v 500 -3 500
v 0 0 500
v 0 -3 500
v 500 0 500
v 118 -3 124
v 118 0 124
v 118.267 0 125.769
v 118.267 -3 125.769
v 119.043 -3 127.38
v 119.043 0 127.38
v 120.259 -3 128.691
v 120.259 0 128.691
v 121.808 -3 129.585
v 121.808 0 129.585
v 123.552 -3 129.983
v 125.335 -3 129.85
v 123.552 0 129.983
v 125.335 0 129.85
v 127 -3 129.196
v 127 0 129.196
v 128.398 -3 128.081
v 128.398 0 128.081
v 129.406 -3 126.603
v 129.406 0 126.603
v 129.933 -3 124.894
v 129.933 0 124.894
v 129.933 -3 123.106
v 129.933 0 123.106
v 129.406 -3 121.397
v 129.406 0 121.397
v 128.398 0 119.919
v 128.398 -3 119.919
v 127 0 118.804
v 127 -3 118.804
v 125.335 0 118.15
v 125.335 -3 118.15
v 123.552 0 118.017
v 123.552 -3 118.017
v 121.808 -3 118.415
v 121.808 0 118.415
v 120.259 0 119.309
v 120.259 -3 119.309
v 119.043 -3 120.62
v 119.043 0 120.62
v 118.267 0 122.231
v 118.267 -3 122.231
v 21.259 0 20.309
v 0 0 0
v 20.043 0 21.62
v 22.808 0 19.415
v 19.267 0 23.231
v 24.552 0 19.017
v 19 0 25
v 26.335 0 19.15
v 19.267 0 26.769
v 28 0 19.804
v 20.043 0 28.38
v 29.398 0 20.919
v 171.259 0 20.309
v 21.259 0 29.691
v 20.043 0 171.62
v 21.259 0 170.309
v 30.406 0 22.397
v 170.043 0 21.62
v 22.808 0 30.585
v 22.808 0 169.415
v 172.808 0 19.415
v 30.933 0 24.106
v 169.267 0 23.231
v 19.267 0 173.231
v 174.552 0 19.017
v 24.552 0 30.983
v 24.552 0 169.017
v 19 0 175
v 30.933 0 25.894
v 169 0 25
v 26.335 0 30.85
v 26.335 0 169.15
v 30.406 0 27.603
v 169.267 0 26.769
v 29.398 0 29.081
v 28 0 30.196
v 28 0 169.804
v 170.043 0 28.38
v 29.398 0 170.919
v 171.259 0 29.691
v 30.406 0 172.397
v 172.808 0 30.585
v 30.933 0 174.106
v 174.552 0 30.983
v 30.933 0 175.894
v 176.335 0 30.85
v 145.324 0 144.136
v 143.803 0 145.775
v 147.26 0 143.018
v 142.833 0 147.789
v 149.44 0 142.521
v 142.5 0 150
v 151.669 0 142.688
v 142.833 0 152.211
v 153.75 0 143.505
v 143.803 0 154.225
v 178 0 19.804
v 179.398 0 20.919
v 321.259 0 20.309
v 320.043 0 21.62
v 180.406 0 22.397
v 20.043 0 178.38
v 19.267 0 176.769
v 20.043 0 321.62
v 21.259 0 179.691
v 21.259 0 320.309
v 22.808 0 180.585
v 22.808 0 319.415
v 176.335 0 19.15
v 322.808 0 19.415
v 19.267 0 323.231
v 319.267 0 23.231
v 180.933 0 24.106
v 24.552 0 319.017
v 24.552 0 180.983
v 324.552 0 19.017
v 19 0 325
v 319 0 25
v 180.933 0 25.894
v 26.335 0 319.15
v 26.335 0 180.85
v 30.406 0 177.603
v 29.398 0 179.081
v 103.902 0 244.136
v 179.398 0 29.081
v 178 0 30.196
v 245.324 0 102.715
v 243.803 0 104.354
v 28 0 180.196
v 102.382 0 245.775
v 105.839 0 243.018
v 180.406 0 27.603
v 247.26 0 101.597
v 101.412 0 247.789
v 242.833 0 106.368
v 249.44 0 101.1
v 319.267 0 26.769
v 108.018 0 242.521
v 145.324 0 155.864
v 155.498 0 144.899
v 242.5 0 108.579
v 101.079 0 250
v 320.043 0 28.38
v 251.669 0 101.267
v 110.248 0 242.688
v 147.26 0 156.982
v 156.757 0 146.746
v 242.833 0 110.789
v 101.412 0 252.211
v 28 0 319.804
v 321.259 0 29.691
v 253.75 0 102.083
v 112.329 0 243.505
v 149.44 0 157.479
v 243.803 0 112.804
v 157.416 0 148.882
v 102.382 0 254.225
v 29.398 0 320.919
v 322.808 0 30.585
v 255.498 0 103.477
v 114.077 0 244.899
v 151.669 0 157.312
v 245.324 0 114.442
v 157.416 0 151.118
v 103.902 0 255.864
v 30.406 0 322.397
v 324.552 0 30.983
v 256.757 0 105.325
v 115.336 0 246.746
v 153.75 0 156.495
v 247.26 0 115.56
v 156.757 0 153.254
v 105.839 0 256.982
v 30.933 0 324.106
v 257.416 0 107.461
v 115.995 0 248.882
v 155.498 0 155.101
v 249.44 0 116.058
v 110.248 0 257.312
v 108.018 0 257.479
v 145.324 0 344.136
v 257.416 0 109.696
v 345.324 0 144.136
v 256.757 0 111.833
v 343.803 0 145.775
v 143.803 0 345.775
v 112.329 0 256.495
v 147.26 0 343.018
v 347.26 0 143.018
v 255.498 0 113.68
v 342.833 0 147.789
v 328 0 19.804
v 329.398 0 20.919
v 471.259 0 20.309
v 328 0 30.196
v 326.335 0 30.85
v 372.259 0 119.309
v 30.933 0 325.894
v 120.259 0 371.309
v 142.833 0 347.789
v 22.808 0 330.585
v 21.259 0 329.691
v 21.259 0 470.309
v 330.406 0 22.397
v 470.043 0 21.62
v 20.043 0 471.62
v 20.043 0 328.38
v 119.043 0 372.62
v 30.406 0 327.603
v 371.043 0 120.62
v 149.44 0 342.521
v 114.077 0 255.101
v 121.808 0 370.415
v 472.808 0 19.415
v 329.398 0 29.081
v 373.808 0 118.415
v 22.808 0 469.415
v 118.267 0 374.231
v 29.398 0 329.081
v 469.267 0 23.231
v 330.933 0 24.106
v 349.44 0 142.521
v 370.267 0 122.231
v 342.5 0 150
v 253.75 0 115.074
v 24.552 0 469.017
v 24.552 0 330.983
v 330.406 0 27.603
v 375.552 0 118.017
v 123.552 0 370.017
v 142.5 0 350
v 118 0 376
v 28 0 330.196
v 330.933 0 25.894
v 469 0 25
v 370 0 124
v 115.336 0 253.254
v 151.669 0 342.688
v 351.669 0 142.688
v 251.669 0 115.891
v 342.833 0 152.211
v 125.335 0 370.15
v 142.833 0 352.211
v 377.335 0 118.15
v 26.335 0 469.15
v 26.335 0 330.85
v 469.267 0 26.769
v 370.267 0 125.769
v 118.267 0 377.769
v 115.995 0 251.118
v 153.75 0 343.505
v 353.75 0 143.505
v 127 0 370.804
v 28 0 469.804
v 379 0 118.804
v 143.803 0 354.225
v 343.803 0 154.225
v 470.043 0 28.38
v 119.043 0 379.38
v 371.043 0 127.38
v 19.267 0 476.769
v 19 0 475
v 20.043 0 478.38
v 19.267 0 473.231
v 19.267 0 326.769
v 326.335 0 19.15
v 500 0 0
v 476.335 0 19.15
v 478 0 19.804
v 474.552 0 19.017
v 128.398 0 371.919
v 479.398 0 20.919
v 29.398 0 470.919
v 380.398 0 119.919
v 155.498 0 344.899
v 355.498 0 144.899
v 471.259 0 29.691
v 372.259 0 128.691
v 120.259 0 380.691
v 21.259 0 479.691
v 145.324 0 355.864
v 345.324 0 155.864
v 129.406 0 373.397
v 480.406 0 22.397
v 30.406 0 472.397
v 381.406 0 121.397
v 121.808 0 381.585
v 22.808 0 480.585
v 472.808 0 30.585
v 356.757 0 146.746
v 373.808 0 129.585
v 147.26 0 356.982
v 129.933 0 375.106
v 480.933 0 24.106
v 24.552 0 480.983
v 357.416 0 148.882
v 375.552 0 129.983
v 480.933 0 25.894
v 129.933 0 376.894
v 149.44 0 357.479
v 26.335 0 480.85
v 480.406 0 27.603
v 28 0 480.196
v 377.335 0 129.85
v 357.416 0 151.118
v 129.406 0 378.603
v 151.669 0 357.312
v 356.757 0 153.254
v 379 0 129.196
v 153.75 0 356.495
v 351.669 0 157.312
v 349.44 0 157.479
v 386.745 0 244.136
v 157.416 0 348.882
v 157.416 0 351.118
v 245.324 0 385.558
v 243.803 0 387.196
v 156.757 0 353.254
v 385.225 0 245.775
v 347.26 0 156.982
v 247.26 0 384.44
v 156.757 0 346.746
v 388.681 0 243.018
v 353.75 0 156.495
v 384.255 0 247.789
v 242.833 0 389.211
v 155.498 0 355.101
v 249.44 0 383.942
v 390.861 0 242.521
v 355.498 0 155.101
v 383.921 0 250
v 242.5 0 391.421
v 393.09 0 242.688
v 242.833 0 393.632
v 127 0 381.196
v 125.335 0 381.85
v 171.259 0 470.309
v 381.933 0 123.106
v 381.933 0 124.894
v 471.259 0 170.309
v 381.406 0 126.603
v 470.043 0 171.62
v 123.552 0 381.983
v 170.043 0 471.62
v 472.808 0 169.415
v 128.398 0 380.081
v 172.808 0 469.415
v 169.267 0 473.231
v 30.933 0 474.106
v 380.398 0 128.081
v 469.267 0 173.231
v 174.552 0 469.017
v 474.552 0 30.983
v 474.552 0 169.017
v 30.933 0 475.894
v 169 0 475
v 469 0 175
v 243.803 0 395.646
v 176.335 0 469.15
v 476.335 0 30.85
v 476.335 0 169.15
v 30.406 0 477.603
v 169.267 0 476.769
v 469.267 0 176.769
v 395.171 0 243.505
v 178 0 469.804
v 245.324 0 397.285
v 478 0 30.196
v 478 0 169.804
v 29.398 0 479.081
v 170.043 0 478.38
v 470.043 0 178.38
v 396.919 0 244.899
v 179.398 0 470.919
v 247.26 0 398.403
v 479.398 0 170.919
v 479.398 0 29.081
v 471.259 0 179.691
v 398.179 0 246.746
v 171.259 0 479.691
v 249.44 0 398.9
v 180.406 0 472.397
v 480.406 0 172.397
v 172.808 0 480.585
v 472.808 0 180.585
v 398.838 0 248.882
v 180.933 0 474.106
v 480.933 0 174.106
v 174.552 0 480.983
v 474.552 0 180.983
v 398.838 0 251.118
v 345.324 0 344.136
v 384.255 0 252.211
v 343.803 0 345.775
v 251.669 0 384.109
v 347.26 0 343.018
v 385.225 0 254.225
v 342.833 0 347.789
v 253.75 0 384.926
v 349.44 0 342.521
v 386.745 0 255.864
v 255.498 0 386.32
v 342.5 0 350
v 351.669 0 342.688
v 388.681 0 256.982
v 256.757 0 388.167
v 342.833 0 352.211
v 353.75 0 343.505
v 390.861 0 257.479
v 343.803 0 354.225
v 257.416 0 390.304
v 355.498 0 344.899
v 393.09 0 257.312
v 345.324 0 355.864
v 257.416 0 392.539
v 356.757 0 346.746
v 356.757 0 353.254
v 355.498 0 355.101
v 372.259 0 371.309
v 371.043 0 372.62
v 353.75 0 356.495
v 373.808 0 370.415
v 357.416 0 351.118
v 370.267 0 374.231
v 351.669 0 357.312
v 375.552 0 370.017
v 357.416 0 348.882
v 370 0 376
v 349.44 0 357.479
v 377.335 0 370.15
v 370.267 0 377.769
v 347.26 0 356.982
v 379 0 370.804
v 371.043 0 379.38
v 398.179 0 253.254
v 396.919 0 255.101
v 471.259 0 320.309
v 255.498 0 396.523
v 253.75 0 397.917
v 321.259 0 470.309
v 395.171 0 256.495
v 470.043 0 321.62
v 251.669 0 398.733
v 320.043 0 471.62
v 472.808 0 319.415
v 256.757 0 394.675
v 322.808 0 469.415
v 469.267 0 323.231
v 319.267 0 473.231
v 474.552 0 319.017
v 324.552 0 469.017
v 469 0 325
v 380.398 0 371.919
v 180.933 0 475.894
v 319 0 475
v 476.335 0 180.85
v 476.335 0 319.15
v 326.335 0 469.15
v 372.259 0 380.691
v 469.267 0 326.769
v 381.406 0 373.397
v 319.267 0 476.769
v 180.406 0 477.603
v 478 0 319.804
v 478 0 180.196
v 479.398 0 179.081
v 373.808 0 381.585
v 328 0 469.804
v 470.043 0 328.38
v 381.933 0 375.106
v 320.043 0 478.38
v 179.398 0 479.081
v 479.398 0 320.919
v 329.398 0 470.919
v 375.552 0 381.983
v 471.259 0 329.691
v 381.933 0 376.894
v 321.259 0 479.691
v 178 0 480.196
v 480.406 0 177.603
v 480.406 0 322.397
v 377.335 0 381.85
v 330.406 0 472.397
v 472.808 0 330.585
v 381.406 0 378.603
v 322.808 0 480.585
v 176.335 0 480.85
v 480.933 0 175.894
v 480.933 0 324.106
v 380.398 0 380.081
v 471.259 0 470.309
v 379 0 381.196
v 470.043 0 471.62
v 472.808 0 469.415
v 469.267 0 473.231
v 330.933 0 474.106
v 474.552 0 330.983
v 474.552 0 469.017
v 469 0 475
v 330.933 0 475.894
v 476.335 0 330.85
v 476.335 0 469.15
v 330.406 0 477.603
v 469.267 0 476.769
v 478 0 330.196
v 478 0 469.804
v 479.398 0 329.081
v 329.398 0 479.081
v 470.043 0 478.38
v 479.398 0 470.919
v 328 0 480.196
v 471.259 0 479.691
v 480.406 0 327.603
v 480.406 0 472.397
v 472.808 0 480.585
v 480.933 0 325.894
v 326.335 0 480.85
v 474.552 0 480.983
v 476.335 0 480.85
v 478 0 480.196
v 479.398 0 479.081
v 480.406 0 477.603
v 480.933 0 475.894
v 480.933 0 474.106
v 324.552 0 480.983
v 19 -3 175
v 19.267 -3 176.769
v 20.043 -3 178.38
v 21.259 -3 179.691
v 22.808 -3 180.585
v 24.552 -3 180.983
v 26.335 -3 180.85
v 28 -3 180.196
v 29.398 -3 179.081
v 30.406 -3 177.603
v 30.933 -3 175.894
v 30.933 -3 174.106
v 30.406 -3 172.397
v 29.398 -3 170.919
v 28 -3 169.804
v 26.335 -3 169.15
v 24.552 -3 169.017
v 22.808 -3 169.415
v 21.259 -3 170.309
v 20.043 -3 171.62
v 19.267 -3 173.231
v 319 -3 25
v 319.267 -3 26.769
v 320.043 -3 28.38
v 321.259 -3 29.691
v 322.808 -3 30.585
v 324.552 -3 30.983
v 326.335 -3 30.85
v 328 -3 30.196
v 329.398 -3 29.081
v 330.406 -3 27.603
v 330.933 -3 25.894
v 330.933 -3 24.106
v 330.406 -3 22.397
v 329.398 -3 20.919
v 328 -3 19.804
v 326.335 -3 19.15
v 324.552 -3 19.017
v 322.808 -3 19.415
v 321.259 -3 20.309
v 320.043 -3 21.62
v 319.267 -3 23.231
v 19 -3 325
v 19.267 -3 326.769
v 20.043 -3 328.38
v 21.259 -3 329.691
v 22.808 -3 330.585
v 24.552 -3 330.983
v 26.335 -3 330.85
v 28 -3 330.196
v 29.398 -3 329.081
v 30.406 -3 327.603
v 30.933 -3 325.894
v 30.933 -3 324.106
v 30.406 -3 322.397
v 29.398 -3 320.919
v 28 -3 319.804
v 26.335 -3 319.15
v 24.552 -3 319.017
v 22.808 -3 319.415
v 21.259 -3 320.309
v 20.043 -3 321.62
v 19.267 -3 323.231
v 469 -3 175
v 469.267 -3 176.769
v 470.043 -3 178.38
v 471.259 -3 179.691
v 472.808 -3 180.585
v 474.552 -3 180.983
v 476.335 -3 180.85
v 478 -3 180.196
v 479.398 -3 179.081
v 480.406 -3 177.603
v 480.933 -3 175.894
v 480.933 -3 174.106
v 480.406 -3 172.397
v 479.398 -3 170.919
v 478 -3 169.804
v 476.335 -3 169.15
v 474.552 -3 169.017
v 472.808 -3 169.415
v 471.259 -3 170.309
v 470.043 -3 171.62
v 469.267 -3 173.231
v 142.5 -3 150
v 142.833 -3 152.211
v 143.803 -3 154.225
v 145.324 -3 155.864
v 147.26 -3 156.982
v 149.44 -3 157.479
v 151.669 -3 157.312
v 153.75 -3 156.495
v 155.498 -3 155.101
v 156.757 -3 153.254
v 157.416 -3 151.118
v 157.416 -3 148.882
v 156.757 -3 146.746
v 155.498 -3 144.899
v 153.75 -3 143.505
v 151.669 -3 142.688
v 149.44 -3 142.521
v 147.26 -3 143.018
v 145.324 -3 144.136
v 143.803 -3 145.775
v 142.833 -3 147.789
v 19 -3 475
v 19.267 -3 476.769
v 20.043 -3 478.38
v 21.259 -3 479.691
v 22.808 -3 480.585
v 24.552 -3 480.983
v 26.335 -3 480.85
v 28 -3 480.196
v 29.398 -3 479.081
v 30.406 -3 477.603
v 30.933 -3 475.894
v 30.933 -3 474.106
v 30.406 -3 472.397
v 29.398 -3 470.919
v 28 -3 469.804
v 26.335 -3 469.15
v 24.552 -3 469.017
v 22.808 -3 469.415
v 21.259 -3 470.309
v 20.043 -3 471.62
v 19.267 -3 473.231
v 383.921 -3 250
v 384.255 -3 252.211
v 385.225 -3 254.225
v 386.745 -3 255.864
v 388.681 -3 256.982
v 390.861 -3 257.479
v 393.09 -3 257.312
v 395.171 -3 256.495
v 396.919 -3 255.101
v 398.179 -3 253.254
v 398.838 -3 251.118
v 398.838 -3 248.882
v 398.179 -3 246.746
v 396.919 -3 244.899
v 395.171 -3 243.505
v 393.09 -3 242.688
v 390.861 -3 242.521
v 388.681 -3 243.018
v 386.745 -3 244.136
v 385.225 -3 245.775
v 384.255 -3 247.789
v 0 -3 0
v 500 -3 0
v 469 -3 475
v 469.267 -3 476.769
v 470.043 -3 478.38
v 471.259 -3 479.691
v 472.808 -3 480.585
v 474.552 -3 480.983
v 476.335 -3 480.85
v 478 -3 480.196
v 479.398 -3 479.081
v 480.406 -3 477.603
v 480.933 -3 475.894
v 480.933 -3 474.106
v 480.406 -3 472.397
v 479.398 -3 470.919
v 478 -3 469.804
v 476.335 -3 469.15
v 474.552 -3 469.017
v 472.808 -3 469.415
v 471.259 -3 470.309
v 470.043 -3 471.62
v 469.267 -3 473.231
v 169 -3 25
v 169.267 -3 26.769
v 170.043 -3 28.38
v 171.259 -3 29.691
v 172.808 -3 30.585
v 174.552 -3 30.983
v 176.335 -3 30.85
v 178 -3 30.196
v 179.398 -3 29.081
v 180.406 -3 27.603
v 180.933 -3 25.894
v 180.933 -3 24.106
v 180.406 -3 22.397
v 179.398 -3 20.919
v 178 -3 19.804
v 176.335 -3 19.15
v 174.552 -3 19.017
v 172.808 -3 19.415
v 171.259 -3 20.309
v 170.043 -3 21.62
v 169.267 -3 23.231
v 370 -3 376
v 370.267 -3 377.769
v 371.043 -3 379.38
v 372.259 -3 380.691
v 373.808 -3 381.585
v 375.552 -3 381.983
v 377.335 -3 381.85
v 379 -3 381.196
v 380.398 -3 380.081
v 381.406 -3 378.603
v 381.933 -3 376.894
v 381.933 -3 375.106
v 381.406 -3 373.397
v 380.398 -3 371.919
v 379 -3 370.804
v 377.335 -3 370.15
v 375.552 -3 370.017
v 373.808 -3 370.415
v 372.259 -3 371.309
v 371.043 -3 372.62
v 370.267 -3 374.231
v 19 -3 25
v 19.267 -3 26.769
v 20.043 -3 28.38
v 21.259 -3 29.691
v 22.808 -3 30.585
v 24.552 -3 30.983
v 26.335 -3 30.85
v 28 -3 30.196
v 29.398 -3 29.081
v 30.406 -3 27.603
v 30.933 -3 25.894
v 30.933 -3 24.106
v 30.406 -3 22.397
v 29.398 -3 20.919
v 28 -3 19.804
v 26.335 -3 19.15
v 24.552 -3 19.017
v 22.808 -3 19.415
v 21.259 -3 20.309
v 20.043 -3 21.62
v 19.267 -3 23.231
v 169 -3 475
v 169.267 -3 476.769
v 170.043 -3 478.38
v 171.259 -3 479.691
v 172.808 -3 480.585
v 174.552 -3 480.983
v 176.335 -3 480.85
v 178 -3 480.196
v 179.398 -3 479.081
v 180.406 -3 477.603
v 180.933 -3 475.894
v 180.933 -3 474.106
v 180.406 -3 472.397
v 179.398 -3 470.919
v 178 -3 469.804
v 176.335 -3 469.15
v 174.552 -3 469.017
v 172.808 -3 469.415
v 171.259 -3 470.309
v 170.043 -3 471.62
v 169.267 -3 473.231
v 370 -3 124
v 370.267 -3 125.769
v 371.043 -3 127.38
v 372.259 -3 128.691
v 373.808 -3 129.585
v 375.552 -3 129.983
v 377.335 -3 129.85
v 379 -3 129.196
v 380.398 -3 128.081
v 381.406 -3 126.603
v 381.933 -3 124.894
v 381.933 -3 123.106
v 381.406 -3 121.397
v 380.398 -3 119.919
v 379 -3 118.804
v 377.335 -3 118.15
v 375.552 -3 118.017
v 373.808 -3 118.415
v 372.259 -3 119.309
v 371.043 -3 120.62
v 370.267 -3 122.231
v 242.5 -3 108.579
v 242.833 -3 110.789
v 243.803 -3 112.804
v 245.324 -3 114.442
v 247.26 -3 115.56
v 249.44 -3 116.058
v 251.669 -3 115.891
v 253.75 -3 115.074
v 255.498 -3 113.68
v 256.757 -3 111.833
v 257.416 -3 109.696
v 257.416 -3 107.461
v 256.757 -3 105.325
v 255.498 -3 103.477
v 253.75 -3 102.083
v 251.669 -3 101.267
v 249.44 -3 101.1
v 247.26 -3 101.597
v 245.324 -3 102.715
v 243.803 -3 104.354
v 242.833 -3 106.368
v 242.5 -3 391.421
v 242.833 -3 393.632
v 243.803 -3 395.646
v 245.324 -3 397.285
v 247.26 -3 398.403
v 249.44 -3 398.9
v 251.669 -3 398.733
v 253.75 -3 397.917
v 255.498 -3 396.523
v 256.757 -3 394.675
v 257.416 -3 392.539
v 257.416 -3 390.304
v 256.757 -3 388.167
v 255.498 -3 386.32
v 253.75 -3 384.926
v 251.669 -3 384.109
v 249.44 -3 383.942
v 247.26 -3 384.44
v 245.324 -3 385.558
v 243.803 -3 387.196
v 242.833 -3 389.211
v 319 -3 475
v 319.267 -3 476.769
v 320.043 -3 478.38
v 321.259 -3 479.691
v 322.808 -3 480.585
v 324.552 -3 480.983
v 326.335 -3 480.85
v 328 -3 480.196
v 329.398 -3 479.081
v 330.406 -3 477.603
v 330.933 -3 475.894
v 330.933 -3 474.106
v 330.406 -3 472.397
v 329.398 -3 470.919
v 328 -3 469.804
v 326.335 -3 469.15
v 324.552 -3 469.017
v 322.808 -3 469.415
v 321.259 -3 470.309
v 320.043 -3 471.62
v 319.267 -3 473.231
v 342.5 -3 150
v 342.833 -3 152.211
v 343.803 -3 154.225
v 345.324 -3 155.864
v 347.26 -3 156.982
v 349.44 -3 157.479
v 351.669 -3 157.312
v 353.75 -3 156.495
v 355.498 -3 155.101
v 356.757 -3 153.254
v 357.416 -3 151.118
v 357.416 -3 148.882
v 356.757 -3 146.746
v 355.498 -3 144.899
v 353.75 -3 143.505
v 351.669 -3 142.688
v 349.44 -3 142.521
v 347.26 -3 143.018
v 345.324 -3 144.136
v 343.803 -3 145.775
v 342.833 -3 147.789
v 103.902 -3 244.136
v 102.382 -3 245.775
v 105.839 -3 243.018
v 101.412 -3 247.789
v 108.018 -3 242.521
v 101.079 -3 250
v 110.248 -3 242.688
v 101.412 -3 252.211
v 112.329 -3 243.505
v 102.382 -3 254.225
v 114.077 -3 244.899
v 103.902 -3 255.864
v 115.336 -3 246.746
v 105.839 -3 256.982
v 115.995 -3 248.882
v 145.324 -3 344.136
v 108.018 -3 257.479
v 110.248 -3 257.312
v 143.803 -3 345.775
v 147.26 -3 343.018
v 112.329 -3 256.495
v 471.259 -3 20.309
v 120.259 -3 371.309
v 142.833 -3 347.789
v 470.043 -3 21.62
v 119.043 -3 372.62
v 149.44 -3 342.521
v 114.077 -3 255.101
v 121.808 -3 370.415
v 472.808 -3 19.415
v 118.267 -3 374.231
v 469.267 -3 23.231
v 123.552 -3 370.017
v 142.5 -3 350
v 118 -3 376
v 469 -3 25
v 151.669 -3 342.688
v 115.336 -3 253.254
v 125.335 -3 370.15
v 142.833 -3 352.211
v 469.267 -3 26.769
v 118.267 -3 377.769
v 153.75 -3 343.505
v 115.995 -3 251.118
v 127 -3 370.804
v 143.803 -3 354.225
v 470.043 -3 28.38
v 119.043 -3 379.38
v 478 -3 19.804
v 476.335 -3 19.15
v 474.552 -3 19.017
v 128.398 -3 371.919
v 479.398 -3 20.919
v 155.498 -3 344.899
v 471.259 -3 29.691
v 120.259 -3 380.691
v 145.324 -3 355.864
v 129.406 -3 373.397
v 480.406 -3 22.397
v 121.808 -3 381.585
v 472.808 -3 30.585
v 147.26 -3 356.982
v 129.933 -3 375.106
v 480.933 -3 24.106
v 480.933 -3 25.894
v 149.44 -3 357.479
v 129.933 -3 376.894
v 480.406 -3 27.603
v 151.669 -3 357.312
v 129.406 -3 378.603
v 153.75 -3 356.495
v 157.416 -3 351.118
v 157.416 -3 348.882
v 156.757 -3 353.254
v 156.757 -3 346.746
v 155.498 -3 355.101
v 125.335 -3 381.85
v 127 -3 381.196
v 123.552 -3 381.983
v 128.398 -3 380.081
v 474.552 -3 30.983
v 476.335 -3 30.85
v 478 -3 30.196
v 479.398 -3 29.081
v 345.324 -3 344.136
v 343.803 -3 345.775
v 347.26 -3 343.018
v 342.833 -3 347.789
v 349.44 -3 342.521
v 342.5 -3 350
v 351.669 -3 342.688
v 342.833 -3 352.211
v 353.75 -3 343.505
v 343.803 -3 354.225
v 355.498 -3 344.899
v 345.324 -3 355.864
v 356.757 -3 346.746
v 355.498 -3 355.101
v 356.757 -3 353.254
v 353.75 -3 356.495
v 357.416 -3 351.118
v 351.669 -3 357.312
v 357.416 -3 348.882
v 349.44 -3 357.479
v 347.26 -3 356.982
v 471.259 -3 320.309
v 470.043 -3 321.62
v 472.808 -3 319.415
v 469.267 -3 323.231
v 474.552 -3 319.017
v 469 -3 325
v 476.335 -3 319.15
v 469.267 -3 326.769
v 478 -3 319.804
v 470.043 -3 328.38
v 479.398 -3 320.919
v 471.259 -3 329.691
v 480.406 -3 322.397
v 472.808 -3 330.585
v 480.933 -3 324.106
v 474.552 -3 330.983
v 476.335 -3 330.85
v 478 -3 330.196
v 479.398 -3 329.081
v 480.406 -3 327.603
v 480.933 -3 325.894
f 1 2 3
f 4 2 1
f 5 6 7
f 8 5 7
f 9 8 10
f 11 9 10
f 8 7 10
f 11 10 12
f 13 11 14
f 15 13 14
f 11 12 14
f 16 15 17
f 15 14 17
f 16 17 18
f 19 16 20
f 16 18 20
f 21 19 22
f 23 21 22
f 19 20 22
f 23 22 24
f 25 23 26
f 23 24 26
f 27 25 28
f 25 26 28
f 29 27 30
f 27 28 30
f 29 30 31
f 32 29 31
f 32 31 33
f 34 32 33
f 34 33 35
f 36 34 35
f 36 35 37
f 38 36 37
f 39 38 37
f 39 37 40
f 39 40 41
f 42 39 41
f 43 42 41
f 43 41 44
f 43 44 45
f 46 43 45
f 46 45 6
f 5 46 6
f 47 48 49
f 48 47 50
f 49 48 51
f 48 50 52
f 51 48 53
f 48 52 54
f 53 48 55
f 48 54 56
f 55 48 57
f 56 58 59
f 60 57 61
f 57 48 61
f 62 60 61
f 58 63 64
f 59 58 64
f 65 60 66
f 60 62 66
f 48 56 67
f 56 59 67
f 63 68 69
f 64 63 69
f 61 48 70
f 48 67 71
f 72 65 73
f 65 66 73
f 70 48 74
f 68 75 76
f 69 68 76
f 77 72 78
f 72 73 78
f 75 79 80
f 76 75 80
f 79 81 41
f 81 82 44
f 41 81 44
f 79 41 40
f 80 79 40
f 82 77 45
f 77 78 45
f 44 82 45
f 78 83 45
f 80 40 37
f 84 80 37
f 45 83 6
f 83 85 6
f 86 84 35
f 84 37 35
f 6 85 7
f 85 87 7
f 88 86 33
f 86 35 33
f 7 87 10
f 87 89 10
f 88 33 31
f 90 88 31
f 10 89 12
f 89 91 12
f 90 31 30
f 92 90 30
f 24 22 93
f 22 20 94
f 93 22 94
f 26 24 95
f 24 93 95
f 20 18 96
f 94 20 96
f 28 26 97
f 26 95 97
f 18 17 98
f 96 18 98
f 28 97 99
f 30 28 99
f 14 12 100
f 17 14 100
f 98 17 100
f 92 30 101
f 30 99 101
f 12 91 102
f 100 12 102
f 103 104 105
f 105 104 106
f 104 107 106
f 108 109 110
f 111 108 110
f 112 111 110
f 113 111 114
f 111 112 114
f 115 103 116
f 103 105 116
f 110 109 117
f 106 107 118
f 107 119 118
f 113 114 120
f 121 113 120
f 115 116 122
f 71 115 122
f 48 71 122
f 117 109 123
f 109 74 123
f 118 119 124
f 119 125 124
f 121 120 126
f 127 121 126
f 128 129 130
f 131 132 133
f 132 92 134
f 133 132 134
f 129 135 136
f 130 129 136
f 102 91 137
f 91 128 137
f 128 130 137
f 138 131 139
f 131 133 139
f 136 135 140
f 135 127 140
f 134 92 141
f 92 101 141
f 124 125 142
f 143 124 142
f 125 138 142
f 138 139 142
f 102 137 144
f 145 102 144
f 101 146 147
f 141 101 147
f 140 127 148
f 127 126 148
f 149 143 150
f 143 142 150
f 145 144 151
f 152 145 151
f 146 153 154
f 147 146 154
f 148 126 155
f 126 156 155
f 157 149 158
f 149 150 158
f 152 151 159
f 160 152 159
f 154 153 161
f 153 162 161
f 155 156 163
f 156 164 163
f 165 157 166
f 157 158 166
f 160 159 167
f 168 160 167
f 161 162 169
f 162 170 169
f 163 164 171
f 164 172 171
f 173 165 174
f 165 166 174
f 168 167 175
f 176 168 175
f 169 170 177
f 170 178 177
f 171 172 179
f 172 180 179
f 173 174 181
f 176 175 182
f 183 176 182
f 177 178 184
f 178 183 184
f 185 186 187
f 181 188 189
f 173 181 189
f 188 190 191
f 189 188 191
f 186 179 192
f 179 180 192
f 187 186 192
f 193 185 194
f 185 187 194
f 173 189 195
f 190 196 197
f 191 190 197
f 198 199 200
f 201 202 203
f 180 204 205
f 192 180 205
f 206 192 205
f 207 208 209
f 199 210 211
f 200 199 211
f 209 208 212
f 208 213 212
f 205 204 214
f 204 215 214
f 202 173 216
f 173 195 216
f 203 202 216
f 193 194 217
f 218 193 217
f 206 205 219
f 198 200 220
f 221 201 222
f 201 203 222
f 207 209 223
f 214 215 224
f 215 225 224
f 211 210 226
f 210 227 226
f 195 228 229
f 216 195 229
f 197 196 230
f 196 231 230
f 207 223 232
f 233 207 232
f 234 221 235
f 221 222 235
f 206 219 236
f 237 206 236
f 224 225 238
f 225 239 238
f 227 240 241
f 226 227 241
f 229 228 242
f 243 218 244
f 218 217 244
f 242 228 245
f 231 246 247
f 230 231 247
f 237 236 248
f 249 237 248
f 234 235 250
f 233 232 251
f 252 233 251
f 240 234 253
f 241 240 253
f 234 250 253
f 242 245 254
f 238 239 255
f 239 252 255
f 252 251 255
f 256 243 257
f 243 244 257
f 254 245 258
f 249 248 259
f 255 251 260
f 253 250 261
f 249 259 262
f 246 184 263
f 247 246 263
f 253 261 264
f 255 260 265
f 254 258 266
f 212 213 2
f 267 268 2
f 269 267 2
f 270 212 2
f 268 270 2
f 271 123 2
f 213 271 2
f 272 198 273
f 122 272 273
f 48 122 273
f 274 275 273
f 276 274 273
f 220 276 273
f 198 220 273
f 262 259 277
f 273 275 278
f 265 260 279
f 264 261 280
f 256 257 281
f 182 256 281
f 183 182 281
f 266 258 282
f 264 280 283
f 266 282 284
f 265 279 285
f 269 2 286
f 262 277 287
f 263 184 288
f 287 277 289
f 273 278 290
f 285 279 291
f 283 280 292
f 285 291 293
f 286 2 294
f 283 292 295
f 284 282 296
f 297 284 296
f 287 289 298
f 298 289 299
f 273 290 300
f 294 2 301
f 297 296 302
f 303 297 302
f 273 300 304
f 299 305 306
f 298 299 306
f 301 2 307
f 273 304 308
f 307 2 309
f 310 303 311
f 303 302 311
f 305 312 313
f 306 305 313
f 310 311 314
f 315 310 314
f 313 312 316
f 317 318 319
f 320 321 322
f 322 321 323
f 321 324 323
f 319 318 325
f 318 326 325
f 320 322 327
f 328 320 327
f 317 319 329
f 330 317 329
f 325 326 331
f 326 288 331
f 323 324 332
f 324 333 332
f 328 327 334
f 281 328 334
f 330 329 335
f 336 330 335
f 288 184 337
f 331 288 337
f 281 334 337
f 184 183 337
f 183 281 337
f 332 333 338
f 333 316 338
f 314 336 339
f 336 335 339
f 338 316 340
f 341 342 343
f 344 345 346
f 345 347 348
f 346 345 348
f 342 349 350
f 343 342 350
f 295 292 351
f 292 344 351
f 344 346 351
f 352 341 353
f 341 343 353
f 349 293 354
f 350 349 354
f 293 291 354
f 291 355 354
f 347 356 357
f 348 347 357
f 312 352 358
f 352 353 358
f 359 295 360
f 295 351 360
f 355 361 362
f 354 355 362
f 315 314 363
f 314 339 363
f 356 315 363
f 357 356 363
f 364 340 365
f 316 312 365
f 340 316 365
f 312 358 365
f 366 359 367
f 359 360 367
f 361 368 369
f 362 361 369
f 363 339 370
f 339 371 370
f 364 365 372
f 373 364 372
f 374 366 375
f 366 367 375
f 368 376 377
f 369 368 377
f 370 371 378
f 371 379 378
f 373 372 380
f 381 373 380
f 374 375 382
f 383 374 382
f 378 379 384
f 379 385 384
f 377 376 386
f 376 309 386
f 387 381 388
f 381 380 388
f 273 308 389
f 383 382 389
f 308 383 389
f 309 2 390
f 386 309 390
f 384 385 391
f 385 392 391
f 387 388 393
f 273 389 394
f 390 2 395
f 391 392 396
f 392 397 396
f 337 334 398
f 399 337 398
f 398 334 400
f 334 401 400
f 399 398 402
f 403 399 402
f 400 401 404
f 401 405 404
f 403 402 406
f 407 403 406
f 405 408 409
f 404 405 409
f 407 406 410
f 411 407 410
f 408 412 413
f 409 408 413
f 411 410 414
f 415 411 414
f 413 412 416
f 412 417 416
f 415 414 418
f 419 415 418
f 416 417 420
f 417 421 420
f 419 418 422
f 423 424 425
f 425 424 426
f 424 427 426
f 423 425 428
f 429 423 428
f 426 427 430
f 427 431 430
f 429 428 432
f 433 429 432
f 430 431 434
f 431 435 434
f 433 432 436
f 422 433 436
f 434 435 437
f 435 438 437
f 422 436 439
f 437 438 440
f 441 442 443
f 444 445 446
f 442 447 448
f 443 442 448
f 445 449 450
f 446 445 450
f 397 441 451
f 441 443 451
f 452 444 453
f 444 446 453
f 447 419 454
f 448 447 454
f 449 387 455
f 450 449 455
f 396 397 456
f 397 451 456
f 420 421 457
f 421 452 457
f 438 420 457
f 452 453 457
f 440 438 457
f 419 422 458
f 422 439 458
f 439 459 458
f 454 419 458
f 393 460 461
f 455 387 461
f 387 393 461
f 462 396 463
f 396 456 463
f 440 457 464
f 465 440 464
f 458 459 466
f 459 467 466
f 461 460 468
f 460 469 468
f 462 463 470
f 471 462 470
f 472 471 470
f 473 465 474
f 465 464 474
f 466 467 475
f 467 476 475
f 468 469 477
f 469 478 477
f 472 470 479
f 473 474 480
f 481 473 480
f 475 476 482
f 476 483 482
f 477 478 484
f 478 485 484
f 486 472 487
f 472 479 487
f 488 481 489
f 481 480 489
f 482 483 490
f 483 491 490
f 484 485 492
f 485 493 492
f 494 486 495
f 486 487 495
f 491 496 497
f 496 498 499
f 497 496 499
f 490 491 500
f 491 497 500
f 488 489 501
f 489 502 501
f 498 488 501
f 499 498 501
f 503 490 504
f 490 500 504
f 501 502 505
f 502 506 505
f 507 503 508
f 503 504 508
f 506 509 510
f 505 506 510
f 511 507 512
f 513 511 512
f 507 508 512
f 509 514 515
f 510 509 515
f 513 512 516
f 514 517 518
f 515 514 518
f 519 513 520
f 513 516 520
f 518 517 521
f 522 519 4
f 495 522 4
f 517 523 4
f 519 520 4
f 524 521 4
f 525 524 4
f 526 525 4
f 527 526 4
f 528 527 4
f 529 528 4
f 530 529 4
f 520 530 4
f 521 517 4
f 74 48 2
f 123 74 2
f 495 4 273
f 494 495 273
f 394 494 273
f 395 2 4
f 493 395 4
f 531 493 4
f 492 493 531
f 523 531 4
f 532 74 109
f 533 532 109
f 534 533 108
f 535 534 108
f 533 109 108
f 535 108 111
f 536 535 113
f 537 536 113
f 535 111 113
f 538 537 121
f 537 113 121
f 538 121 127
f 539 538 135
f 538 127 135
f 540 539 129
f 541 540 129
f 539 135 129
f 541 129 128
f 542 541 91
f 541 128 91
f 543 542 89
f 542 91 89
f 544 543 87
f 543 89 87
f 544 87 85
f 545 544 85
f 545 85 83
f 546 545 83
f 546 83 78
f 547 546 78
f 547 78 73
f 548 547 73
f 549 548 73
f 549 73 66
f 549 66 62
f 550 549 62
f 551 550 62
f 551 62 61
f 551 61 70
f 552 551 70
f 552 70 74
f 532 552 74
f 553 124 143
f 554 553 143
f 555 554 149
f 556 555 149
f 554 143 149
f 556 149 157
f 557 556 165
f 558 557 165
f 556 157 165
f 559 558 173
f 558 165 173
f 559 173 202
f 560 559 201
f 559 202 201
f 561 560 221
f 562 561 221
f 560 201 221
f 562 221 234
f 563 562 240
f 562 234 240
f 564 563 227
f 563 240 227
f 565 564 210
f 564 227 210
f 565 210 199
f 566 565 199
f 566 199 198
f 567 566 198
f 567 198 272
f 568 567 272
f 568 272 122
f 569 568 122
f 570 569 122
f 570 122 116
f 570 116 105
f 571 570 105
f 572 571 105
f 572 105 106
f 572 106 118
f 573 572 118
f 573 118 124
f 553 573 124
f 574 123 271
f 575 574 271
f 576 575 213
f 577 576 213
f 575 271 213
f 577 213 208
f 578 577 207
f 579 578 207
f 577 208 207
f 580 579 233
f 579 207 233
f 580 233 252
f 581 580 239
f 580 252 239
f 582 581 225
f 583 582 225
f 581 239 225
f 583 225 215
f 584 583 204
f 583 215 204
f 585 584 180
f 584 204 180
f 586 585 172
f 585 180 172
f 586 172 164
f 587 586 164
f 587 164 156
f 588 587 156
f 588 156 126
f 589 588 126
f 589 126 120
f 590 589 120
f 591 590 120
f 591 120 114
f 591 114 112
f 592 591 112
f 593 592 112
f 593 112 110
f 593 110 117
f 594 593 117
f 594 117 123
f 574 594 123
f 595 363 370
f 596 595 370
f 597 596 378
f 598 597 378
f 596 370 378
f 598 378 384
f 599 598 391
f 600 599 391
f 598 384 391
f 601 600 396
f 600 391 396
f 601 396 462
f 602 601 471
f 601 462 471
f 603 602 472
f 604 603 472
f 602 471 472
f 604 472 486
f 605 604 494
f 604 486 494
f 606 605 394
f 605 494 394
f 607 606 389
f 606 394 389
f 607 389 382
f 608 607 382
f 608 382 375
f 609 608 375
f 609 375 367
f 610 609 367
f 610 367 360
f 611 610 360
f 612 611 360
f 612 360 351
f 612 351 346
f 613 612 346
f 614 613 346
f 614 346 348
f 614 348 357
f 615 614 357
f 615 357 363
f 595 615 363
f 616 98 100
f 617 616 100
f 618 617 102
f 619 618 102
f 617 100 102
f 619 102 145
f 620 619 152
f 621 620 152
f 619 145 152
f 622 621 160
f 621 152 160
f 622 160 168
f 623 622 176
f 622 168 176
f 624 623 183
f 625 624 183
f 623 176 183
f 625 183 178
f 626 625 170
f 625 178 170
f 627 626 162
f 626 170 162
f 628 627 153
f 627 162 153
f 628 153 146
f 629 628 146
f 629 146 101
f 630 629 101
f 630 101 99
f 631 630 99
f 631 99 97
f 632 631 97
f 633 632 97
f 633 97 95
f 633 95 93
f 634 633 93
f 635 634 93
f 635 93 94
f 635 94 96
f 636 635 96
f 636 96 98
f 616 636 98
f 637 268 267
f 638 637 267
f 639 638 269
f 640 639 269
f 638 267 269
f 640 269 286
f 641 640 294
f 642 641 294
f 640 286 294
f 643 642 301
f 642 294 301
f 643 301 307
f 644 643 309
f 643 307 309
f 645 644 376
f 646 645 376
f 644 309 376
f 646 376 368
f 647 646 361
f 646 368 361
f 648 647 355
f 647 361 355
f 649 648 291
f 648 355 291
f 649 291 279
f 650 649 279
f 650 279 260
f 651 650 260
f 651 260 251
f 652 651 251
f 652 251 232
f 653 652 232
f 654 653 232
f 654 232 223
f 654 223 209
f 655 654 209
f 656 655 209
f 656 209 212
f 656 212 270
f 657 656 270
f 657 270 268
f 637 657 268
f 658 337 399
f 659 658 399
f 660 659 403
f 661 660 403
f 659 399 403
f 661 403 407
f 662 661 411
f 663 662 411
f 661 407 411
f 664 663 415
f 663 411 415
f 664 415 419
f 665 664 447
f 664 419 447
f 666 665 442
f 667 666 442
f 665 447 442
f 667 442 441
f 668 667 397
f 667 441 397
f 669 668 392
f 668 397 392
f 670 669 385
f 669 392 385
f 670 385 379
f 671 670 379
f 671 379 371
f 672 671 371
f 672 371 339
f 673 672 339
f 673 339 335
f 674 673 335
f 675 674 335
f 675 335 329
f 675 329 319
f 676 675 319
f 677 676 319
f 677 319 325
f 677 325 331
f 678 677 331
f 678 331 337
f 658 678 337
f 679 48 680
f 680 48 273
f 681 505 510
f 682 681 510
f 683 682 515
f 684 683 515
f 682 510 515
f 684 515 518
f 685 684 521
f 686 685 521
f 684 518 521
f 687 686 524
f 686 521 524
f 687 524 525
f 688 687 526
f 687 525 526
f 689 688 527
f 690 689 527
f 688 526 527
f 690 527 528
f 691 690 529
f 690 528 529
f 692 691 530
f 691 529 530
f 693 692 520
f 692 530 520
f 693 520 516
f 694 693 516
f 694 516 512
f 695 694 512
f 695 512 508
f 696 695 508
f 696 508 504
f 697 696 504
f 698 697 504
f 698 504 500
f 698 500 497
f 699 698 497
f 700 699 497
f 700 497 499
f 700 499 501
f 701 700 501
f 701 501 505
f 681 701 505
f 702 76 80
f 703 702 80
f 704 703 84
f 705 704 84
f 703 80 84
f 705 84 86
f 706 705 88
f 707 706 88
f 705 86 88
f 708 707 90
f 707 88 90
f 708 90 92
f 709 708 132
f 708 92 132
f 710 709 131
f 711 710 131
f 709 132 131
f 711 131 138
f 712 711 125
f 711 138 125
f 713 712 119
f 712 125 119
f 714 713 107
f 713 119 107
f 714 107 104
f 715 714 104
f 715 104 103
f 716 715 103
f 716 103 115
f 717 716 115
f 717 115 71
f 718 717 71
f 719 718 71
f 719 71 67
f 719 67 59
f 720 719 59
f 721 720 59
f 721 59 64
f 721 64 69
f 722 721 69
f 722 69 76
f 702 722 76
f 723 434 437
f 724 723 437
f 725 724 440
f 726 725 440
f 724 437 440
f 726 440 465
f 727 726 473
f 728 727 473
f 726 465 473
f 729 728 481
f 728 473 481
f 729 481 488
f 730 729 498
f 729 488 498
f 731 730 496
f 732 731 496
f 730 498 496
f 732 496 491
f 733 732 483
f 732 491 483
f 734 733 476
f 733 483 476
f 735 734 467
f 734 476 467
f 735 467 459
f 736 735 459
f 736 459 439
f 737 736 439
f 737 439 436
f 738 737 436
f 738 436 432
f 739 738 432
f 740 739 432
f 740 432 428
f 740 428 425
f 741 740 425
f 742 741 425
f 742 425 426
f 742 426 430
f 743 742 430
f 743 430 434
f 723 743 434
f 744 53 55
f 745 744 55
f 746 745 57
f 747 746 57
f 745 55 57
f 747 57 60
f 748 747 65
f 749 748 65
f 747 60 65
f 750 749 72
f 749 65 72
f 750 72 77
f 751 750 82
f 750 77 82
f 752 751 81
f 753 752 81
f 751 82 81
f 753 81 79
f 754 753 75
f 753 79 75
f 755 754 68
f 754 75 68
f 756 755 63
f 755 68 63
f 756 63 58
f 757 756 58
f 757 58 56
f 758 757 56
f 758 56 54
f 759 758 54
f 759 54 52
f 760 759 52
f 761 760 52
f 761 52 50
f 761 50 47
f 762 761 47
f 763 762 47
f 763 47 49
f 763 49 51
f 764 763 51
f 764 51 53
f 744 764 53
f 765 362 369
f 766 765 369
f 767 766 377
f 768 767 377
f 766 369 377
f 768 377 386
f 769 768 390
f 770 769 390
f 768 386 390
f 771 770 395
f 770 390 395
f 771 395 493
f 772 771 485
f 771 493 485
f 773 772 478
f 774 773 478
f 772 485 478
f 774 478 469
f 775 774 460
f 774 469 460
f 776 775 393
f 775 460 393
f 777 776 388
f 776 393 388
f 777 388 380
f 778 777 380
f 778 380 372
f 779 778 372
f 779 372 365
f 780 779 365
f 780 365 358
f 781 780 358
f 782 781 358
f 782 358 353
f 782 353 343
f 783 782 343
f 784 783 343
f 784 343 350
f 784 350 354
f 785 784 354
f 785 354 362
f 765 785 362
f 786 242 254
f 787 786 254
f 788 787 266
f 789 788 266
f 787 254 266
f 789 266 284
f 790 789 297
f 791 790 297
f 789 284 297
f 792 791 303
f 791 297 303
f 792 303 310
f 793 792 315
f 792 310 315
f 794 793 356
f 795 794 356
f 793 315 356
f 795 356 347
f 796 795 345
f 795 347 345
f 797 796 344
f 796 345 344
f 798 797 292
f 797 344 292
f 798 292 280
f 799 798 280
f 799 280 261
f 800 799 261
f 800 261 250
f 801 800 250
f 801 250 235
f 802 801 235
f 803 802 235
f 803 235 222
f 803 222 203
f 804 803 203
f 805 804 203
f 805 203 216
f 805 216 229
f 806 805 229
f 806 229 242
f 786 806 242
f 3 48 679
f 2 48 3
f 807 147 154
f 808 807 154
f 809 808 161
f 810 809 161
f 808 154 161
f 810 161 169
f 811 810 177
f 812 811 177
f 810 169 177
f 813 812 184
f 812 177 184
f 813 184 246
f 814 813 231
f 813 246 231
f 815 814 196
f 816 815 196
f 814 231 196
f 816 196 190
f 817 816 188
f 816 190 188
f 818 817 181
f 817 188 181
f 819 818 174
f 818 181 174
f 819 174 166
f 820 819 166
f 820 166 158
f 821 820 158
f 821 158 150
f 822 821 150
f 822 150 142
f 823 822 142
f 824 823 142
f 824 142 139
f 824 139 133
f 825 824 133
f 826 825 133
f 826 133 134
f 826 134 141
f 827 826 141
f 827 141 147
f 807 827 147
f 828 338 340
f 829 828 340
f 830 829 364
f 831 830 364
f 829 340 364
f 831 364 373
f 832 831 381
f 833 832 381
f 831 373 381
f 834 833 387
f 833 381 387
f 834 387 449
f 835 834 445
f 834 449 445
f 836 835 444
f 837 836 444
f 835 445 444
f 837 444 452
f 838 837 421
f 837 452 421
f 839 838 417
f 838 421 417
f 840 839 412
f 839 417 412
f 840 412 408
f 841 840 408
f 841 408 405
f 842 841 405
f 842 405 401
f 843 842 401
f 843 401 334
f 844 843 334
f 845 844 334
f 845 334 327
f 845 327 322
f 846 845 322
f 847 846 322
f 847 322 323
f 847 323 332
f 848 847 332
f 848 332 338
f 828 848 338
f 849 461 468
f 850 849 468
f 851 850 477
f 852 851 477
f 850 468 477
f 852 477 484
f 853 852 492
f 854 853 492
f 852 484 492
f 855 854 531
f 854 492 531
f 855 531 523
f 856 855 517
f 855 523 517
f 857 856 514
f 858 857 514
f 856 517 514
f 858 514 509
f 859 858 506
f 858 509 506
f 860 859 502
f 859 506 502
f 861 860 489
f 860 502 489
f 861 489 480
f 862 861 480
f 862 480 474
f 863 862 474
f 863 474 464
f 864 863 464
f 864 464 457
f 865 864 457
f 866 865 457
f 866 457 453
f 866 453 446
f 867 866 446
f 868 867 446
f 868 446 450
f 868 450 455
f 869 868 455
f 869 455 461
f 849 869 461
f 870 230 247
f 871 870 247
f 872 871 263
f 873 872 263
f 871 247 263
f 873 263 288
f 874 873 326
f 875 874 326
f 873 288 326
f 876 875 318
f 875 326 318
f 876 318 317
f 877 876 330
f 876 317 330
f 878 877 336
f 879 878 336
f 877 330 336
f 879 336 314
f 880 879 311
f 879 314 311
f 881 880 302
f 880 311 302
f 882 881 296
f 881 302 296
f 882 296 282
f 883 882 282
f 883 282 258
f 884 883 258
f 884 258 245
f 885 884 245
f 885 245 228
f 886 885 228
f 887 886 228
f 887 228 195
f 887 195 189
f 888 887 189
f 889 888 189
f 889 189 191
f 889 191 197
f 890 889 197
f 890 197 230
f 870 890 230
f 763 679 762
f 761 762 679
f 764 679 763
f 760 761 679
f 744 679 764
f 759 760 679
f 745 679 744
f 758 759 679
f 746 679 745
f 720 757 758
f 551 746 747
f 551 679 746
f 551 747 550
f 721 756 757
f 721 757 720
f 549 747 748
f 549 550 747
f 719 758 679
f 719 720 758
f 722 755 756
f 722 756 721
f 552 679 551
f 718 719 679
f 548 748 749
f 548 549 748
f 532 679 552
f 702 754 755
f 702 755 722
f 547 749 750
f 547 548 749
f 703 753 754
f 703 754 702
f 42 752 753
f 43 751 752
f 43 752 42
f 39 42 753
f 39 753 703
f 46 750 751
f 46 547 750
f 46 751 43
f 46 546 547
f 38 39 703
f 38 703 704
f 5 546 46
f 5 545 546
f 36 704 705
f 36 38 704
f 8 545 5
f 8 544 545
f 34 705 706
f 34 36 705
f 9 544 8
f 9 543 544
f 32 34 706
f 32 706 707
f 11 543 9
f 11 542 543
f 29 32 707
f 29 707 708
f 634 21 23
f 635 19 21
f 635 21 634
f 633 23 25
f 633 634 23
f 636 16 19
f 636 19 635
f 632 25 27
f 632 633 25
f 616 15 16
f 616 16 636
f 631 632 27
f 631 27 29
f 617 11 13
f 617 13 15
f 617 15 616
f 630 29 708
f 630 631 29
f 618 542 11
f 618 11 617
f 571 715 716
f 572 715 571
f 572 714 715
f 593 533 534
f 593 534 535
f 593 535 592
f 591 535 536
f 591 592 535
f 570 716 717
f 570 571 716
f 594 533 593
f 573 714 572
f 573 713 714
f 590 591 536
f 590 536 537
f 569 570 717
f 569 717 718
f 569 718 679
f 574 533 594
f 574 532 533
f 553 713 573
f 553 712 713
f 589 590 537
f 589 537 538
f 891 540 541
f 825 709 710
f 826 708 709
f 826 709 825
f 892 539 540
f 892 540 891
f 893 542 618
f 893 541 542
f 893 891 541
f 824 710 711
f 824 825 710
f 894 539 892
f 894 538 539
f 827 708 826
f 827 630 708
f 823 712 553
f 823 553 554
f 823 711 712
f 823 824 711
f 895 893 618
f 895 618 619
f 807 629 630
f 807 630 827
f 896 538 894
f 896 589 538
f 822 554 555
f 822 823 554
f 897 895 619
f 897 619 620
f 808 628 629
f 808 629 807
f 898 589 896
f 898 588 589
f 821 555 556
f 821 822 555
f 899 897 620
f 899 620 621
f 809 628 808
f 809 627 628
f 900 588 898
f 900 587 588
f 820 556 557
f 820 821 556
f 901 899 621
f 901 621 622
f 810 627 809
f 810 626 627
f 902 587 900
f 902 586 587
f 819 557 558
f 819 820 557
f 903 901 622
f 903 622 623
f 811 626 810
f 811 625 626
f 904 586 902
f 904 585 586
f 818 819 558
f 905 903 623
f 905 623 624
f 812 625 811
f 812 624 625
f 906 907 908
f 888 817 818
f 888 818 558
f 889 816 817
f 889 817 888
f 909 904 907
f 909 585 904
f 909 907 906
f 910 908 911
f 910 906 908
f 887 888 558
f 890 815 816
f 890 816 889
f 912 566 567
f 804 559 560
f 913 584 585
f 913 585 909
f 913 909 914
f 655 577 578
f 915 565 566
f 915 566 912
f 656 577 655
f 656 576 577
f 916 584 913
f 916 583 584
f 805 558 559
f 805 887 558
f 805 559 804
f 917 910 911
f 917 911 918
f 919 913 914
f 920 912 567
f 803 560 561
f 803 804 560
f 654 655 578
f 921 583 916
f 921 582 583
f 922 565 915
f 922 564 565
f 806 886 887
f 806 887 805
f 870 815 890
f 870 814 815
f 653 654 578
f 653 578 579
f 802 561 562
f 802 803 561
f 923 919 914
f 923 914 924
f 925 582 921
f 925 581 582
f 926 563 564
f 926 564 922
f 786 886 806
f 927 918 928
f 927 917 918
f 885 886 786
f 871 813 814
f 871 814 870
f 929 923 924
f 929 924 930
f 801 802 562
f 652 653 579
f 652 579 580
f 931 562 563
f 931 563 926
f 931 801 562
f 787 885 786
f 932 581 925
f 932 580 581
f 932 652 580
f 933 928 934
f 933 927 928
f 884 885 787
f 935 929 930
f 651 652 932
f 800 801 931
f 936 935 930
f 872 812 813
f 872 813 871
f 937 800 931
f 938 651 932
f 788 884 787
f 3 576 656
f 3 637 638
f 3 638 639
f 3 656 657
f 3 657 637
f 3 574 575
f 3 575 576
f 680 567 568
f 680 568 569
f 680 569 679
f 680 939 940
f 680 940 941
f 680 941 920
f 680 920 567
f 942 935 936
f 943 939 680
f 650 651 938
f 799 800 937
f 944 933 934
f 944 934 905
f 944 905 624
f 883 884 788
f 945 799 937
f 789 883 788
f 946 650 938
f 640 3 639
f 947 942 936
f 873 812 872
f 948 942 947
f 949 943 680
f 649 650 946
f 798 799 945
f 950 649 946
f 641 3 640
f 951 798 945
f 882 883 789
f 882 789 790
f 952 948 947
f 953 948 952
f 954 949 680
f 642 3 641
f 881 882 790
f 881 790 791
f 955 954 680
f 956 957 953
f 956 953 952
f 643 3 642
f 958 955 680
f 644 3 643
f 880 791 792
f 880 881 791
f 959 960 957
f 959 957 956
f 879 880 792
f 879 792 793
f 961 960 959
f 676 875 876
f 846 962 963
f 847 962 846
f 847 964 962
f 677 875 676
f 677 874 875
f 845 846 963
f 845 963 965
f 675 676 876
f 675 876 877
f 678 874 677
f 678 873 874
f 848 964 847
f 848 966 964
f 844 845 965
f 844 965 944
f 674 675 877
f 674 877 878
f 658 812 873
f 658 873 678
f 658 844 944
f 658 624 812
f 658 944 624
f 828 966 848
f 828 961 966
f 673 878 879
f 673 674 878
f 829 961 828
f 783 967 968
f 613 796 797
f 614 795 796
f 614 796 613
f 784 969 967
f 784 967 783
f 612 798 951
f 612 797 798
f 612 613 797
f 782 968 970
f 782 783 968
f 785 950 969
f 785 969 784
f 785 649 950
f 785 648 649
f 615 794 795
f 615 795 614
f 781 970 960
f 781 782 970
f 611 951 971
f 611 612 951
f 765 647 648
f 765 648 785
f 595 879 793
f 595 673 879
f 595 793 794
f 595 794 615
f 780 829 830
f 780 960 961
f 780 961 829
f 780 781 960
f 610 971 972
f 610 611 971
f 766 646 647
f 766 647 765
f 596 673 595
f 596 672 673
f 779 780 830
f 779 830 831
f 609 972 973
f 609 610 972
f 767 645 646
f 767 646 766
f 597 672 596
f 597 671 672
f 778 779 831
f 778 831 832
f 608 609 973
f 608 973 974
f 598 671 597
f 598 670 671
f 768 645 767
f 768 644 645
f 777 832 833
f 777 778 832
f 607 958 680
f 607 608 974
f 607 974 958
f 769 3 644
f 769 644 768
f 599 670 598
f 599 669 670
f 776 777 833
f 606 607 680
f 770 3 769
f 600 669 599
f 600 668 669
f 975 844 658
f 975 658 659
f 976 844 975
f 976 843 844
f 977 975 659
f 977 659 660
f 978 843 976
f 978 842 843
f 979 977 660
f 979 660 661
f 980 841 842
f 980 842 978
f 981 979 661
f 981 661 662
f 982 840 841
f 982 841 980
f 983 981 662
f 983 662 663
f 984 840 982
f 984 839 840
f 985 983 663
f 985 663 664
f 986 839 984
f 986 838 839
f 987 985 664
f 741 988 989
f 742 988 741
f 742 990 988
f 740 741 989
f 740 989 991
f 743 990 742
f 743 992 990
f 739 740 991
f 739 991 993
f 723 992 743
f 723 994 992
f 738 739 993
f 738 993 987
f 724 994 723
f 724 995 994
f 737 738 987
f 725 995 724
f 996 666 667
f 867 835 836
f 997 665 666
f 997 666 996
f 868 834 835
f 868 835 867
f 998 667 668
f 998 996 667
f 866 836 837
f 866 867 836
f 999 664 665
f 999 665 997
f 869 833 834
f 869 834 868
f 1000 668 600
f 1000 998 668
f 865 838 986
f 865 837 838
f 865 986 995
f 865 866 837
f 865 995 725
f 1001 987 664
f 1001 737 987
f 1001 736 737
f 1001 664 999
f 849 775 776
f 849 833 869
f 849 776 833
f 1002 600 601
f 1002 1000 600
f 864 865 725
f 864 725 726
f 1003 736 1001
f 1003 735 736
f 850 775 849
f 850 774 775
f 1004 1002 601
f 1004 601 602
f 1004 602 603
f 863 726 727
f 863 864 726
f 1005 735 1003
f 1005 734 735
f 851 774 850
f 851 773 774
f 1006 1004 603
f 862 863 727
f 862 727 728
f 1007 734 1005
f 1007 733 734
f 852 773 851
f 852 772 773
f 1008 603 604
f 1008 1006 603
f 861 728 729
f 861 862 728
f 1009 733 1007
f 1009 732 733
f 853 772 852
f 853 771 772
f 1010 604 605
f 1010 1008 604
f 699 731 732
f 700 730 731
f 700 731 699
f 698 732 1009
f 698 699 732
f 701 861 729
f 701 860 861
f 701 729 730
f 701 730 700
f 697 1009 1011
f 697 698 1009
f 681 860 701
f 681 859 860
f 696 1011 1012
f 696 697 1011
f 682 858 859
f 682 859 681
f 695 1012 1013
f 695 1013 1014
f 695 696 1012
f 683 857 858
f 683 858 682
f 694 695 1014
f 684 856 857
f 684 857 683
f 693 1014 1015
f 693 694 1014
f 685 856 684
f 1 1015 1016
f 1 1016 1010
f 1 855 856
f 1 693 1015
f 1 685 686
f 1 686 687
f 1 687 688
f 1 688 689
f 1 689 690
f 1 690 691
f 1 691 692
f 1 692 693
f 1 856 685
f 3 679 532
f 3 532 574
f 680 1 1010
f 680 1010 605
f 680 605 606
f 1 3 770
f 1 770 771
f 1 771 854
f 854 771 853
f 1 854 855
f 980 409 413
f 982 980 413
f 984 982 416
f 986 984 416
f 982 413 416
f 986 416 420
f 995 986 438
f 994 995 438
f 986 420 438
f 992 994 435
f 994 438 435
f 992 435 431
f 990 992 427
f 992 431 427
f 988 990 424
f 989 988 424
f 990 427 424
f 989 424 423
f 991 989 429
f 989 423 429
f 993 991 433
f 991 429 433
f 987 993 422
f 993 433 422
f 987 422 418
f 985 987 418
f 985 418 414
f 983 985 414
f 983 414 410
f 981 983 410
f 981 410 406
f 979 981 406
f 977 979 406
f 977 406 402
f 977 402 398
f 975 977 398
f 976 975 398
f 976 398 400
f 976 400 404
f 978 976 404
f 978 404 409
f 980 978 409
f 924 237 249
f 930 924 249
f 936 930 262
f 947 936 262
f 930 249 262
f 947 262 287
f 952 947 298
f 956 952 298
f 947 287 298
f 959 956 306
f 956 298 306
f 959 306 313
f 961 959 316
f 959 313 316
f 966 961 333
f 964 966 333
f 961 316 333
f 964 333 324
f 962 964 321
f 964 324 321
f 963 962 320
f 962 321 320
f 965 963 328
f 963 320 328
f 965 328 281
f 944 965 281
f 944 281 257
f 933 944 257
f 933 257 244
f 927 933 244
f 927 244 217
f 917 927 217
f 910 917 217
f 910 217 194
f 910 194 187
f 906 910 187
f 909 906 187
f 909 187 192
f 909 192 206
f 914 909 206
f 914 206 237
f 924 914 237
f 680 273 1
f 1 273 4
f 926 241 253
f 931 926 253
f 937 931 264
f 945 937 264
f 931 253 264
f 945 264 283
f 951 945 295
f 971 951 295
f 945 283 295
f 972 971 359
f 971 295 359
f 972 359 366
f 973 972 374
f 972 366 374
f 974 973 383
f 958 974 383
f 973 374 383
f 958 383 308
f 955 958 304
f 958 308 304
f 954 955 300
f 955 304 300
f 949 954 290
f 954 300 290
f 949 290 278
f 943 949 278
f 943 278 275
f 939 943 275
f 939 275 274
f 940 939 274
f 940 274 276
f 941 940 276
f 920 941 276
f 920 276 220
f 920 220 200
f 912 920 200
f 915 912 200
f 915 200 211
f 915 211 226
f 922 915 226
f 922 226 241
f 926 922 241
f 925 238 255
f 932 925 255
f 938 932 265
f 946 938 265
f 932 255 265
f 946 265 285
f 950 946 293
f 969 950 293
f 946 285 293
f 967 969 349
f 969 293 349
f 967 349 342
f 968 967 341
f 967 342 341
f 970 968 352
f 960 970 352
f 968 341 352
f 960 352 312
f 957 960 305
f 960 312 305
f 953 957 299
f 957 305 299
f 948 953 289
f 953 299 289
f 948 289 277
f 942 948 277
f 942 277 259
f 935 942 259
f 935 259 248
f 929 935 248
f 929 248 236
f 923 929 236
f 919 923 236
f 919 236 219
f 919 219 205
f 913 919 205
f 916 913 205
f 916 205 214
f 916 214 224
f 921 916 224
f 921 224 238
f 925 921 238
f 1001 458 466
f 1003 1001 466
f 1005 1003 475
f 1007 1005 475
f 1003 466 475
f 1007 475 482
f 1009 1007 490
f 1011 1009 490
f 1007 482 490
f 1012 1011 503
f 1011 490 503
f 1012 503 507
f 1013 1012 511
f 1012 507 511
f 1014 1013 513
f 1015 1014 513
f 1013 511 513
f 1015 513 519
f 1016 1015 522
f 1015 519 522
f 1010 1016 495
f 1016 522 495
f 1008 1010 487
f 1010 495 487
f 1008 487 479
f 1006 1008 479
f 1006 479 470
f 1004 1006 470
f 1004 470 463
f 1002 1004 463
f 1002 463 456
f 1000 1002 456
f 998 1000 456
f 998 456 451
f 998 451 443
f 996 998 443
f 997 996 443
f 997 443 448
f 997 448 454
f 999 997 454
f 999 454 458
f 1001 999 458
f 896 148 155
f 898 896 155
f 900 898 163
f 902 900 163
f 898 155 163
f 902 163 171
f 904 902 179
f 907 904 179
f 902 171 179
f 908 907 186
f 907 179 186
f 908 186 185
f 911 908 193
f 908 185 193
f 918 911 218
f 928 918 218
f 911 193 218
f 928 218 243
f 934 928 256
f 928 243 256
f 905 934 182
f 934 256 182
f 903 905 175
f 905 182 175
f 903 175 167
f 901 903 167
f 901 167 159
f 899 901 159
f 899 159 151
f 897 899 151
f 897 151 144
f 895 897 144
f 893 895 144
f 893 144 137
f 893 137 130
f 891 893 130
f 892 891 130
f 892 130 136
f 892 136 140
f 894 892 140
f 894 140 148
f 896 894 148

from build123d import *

# Parameters (mm, degrees)
F0_W     = 500
F0_H     = 500
F1_DEPTH = 3
F3_D     = 15
F5_D     = 12
F7_D     = 12


with BuildPart() as f1:
    # F0 (on Front) → F1 (new body)
    with BuildSketch(Plane.XZ):
        with Locations((250, 250)):
            Rectangle(F0_W, F0_H)
    extrude(amount=F1_DEPTH)

    # F3 (through all)
    with Locations(Plane.XZ.offset(3)):
        with Locations((150, 350), (250, 391.421356), (350, 350), (391.421356, 250), (350, 150), (250, 108.578644), (150, 150), (108.578644, 250)):
            Hole(F3_D / 2)

    # F5 (through all)
    with Locations(Plane.XZ.offset(3)):
        with Locations((25, 325), (25, 475), (175, 475), (325, 475), (475, 475), (475, 325), (475, 175), (475, 25), (325, 25), (175, 25), (25, 25), (25, 175)):
            Hole(F5_D / 2)

    # F7 (through all)
    with Locations(Plane.XZ.offset(3)):
        with Locations((124, 376), (376, 376), (376, 124), (124, 124)):
            Hole(F7_D / 2)


solid = f1.part
